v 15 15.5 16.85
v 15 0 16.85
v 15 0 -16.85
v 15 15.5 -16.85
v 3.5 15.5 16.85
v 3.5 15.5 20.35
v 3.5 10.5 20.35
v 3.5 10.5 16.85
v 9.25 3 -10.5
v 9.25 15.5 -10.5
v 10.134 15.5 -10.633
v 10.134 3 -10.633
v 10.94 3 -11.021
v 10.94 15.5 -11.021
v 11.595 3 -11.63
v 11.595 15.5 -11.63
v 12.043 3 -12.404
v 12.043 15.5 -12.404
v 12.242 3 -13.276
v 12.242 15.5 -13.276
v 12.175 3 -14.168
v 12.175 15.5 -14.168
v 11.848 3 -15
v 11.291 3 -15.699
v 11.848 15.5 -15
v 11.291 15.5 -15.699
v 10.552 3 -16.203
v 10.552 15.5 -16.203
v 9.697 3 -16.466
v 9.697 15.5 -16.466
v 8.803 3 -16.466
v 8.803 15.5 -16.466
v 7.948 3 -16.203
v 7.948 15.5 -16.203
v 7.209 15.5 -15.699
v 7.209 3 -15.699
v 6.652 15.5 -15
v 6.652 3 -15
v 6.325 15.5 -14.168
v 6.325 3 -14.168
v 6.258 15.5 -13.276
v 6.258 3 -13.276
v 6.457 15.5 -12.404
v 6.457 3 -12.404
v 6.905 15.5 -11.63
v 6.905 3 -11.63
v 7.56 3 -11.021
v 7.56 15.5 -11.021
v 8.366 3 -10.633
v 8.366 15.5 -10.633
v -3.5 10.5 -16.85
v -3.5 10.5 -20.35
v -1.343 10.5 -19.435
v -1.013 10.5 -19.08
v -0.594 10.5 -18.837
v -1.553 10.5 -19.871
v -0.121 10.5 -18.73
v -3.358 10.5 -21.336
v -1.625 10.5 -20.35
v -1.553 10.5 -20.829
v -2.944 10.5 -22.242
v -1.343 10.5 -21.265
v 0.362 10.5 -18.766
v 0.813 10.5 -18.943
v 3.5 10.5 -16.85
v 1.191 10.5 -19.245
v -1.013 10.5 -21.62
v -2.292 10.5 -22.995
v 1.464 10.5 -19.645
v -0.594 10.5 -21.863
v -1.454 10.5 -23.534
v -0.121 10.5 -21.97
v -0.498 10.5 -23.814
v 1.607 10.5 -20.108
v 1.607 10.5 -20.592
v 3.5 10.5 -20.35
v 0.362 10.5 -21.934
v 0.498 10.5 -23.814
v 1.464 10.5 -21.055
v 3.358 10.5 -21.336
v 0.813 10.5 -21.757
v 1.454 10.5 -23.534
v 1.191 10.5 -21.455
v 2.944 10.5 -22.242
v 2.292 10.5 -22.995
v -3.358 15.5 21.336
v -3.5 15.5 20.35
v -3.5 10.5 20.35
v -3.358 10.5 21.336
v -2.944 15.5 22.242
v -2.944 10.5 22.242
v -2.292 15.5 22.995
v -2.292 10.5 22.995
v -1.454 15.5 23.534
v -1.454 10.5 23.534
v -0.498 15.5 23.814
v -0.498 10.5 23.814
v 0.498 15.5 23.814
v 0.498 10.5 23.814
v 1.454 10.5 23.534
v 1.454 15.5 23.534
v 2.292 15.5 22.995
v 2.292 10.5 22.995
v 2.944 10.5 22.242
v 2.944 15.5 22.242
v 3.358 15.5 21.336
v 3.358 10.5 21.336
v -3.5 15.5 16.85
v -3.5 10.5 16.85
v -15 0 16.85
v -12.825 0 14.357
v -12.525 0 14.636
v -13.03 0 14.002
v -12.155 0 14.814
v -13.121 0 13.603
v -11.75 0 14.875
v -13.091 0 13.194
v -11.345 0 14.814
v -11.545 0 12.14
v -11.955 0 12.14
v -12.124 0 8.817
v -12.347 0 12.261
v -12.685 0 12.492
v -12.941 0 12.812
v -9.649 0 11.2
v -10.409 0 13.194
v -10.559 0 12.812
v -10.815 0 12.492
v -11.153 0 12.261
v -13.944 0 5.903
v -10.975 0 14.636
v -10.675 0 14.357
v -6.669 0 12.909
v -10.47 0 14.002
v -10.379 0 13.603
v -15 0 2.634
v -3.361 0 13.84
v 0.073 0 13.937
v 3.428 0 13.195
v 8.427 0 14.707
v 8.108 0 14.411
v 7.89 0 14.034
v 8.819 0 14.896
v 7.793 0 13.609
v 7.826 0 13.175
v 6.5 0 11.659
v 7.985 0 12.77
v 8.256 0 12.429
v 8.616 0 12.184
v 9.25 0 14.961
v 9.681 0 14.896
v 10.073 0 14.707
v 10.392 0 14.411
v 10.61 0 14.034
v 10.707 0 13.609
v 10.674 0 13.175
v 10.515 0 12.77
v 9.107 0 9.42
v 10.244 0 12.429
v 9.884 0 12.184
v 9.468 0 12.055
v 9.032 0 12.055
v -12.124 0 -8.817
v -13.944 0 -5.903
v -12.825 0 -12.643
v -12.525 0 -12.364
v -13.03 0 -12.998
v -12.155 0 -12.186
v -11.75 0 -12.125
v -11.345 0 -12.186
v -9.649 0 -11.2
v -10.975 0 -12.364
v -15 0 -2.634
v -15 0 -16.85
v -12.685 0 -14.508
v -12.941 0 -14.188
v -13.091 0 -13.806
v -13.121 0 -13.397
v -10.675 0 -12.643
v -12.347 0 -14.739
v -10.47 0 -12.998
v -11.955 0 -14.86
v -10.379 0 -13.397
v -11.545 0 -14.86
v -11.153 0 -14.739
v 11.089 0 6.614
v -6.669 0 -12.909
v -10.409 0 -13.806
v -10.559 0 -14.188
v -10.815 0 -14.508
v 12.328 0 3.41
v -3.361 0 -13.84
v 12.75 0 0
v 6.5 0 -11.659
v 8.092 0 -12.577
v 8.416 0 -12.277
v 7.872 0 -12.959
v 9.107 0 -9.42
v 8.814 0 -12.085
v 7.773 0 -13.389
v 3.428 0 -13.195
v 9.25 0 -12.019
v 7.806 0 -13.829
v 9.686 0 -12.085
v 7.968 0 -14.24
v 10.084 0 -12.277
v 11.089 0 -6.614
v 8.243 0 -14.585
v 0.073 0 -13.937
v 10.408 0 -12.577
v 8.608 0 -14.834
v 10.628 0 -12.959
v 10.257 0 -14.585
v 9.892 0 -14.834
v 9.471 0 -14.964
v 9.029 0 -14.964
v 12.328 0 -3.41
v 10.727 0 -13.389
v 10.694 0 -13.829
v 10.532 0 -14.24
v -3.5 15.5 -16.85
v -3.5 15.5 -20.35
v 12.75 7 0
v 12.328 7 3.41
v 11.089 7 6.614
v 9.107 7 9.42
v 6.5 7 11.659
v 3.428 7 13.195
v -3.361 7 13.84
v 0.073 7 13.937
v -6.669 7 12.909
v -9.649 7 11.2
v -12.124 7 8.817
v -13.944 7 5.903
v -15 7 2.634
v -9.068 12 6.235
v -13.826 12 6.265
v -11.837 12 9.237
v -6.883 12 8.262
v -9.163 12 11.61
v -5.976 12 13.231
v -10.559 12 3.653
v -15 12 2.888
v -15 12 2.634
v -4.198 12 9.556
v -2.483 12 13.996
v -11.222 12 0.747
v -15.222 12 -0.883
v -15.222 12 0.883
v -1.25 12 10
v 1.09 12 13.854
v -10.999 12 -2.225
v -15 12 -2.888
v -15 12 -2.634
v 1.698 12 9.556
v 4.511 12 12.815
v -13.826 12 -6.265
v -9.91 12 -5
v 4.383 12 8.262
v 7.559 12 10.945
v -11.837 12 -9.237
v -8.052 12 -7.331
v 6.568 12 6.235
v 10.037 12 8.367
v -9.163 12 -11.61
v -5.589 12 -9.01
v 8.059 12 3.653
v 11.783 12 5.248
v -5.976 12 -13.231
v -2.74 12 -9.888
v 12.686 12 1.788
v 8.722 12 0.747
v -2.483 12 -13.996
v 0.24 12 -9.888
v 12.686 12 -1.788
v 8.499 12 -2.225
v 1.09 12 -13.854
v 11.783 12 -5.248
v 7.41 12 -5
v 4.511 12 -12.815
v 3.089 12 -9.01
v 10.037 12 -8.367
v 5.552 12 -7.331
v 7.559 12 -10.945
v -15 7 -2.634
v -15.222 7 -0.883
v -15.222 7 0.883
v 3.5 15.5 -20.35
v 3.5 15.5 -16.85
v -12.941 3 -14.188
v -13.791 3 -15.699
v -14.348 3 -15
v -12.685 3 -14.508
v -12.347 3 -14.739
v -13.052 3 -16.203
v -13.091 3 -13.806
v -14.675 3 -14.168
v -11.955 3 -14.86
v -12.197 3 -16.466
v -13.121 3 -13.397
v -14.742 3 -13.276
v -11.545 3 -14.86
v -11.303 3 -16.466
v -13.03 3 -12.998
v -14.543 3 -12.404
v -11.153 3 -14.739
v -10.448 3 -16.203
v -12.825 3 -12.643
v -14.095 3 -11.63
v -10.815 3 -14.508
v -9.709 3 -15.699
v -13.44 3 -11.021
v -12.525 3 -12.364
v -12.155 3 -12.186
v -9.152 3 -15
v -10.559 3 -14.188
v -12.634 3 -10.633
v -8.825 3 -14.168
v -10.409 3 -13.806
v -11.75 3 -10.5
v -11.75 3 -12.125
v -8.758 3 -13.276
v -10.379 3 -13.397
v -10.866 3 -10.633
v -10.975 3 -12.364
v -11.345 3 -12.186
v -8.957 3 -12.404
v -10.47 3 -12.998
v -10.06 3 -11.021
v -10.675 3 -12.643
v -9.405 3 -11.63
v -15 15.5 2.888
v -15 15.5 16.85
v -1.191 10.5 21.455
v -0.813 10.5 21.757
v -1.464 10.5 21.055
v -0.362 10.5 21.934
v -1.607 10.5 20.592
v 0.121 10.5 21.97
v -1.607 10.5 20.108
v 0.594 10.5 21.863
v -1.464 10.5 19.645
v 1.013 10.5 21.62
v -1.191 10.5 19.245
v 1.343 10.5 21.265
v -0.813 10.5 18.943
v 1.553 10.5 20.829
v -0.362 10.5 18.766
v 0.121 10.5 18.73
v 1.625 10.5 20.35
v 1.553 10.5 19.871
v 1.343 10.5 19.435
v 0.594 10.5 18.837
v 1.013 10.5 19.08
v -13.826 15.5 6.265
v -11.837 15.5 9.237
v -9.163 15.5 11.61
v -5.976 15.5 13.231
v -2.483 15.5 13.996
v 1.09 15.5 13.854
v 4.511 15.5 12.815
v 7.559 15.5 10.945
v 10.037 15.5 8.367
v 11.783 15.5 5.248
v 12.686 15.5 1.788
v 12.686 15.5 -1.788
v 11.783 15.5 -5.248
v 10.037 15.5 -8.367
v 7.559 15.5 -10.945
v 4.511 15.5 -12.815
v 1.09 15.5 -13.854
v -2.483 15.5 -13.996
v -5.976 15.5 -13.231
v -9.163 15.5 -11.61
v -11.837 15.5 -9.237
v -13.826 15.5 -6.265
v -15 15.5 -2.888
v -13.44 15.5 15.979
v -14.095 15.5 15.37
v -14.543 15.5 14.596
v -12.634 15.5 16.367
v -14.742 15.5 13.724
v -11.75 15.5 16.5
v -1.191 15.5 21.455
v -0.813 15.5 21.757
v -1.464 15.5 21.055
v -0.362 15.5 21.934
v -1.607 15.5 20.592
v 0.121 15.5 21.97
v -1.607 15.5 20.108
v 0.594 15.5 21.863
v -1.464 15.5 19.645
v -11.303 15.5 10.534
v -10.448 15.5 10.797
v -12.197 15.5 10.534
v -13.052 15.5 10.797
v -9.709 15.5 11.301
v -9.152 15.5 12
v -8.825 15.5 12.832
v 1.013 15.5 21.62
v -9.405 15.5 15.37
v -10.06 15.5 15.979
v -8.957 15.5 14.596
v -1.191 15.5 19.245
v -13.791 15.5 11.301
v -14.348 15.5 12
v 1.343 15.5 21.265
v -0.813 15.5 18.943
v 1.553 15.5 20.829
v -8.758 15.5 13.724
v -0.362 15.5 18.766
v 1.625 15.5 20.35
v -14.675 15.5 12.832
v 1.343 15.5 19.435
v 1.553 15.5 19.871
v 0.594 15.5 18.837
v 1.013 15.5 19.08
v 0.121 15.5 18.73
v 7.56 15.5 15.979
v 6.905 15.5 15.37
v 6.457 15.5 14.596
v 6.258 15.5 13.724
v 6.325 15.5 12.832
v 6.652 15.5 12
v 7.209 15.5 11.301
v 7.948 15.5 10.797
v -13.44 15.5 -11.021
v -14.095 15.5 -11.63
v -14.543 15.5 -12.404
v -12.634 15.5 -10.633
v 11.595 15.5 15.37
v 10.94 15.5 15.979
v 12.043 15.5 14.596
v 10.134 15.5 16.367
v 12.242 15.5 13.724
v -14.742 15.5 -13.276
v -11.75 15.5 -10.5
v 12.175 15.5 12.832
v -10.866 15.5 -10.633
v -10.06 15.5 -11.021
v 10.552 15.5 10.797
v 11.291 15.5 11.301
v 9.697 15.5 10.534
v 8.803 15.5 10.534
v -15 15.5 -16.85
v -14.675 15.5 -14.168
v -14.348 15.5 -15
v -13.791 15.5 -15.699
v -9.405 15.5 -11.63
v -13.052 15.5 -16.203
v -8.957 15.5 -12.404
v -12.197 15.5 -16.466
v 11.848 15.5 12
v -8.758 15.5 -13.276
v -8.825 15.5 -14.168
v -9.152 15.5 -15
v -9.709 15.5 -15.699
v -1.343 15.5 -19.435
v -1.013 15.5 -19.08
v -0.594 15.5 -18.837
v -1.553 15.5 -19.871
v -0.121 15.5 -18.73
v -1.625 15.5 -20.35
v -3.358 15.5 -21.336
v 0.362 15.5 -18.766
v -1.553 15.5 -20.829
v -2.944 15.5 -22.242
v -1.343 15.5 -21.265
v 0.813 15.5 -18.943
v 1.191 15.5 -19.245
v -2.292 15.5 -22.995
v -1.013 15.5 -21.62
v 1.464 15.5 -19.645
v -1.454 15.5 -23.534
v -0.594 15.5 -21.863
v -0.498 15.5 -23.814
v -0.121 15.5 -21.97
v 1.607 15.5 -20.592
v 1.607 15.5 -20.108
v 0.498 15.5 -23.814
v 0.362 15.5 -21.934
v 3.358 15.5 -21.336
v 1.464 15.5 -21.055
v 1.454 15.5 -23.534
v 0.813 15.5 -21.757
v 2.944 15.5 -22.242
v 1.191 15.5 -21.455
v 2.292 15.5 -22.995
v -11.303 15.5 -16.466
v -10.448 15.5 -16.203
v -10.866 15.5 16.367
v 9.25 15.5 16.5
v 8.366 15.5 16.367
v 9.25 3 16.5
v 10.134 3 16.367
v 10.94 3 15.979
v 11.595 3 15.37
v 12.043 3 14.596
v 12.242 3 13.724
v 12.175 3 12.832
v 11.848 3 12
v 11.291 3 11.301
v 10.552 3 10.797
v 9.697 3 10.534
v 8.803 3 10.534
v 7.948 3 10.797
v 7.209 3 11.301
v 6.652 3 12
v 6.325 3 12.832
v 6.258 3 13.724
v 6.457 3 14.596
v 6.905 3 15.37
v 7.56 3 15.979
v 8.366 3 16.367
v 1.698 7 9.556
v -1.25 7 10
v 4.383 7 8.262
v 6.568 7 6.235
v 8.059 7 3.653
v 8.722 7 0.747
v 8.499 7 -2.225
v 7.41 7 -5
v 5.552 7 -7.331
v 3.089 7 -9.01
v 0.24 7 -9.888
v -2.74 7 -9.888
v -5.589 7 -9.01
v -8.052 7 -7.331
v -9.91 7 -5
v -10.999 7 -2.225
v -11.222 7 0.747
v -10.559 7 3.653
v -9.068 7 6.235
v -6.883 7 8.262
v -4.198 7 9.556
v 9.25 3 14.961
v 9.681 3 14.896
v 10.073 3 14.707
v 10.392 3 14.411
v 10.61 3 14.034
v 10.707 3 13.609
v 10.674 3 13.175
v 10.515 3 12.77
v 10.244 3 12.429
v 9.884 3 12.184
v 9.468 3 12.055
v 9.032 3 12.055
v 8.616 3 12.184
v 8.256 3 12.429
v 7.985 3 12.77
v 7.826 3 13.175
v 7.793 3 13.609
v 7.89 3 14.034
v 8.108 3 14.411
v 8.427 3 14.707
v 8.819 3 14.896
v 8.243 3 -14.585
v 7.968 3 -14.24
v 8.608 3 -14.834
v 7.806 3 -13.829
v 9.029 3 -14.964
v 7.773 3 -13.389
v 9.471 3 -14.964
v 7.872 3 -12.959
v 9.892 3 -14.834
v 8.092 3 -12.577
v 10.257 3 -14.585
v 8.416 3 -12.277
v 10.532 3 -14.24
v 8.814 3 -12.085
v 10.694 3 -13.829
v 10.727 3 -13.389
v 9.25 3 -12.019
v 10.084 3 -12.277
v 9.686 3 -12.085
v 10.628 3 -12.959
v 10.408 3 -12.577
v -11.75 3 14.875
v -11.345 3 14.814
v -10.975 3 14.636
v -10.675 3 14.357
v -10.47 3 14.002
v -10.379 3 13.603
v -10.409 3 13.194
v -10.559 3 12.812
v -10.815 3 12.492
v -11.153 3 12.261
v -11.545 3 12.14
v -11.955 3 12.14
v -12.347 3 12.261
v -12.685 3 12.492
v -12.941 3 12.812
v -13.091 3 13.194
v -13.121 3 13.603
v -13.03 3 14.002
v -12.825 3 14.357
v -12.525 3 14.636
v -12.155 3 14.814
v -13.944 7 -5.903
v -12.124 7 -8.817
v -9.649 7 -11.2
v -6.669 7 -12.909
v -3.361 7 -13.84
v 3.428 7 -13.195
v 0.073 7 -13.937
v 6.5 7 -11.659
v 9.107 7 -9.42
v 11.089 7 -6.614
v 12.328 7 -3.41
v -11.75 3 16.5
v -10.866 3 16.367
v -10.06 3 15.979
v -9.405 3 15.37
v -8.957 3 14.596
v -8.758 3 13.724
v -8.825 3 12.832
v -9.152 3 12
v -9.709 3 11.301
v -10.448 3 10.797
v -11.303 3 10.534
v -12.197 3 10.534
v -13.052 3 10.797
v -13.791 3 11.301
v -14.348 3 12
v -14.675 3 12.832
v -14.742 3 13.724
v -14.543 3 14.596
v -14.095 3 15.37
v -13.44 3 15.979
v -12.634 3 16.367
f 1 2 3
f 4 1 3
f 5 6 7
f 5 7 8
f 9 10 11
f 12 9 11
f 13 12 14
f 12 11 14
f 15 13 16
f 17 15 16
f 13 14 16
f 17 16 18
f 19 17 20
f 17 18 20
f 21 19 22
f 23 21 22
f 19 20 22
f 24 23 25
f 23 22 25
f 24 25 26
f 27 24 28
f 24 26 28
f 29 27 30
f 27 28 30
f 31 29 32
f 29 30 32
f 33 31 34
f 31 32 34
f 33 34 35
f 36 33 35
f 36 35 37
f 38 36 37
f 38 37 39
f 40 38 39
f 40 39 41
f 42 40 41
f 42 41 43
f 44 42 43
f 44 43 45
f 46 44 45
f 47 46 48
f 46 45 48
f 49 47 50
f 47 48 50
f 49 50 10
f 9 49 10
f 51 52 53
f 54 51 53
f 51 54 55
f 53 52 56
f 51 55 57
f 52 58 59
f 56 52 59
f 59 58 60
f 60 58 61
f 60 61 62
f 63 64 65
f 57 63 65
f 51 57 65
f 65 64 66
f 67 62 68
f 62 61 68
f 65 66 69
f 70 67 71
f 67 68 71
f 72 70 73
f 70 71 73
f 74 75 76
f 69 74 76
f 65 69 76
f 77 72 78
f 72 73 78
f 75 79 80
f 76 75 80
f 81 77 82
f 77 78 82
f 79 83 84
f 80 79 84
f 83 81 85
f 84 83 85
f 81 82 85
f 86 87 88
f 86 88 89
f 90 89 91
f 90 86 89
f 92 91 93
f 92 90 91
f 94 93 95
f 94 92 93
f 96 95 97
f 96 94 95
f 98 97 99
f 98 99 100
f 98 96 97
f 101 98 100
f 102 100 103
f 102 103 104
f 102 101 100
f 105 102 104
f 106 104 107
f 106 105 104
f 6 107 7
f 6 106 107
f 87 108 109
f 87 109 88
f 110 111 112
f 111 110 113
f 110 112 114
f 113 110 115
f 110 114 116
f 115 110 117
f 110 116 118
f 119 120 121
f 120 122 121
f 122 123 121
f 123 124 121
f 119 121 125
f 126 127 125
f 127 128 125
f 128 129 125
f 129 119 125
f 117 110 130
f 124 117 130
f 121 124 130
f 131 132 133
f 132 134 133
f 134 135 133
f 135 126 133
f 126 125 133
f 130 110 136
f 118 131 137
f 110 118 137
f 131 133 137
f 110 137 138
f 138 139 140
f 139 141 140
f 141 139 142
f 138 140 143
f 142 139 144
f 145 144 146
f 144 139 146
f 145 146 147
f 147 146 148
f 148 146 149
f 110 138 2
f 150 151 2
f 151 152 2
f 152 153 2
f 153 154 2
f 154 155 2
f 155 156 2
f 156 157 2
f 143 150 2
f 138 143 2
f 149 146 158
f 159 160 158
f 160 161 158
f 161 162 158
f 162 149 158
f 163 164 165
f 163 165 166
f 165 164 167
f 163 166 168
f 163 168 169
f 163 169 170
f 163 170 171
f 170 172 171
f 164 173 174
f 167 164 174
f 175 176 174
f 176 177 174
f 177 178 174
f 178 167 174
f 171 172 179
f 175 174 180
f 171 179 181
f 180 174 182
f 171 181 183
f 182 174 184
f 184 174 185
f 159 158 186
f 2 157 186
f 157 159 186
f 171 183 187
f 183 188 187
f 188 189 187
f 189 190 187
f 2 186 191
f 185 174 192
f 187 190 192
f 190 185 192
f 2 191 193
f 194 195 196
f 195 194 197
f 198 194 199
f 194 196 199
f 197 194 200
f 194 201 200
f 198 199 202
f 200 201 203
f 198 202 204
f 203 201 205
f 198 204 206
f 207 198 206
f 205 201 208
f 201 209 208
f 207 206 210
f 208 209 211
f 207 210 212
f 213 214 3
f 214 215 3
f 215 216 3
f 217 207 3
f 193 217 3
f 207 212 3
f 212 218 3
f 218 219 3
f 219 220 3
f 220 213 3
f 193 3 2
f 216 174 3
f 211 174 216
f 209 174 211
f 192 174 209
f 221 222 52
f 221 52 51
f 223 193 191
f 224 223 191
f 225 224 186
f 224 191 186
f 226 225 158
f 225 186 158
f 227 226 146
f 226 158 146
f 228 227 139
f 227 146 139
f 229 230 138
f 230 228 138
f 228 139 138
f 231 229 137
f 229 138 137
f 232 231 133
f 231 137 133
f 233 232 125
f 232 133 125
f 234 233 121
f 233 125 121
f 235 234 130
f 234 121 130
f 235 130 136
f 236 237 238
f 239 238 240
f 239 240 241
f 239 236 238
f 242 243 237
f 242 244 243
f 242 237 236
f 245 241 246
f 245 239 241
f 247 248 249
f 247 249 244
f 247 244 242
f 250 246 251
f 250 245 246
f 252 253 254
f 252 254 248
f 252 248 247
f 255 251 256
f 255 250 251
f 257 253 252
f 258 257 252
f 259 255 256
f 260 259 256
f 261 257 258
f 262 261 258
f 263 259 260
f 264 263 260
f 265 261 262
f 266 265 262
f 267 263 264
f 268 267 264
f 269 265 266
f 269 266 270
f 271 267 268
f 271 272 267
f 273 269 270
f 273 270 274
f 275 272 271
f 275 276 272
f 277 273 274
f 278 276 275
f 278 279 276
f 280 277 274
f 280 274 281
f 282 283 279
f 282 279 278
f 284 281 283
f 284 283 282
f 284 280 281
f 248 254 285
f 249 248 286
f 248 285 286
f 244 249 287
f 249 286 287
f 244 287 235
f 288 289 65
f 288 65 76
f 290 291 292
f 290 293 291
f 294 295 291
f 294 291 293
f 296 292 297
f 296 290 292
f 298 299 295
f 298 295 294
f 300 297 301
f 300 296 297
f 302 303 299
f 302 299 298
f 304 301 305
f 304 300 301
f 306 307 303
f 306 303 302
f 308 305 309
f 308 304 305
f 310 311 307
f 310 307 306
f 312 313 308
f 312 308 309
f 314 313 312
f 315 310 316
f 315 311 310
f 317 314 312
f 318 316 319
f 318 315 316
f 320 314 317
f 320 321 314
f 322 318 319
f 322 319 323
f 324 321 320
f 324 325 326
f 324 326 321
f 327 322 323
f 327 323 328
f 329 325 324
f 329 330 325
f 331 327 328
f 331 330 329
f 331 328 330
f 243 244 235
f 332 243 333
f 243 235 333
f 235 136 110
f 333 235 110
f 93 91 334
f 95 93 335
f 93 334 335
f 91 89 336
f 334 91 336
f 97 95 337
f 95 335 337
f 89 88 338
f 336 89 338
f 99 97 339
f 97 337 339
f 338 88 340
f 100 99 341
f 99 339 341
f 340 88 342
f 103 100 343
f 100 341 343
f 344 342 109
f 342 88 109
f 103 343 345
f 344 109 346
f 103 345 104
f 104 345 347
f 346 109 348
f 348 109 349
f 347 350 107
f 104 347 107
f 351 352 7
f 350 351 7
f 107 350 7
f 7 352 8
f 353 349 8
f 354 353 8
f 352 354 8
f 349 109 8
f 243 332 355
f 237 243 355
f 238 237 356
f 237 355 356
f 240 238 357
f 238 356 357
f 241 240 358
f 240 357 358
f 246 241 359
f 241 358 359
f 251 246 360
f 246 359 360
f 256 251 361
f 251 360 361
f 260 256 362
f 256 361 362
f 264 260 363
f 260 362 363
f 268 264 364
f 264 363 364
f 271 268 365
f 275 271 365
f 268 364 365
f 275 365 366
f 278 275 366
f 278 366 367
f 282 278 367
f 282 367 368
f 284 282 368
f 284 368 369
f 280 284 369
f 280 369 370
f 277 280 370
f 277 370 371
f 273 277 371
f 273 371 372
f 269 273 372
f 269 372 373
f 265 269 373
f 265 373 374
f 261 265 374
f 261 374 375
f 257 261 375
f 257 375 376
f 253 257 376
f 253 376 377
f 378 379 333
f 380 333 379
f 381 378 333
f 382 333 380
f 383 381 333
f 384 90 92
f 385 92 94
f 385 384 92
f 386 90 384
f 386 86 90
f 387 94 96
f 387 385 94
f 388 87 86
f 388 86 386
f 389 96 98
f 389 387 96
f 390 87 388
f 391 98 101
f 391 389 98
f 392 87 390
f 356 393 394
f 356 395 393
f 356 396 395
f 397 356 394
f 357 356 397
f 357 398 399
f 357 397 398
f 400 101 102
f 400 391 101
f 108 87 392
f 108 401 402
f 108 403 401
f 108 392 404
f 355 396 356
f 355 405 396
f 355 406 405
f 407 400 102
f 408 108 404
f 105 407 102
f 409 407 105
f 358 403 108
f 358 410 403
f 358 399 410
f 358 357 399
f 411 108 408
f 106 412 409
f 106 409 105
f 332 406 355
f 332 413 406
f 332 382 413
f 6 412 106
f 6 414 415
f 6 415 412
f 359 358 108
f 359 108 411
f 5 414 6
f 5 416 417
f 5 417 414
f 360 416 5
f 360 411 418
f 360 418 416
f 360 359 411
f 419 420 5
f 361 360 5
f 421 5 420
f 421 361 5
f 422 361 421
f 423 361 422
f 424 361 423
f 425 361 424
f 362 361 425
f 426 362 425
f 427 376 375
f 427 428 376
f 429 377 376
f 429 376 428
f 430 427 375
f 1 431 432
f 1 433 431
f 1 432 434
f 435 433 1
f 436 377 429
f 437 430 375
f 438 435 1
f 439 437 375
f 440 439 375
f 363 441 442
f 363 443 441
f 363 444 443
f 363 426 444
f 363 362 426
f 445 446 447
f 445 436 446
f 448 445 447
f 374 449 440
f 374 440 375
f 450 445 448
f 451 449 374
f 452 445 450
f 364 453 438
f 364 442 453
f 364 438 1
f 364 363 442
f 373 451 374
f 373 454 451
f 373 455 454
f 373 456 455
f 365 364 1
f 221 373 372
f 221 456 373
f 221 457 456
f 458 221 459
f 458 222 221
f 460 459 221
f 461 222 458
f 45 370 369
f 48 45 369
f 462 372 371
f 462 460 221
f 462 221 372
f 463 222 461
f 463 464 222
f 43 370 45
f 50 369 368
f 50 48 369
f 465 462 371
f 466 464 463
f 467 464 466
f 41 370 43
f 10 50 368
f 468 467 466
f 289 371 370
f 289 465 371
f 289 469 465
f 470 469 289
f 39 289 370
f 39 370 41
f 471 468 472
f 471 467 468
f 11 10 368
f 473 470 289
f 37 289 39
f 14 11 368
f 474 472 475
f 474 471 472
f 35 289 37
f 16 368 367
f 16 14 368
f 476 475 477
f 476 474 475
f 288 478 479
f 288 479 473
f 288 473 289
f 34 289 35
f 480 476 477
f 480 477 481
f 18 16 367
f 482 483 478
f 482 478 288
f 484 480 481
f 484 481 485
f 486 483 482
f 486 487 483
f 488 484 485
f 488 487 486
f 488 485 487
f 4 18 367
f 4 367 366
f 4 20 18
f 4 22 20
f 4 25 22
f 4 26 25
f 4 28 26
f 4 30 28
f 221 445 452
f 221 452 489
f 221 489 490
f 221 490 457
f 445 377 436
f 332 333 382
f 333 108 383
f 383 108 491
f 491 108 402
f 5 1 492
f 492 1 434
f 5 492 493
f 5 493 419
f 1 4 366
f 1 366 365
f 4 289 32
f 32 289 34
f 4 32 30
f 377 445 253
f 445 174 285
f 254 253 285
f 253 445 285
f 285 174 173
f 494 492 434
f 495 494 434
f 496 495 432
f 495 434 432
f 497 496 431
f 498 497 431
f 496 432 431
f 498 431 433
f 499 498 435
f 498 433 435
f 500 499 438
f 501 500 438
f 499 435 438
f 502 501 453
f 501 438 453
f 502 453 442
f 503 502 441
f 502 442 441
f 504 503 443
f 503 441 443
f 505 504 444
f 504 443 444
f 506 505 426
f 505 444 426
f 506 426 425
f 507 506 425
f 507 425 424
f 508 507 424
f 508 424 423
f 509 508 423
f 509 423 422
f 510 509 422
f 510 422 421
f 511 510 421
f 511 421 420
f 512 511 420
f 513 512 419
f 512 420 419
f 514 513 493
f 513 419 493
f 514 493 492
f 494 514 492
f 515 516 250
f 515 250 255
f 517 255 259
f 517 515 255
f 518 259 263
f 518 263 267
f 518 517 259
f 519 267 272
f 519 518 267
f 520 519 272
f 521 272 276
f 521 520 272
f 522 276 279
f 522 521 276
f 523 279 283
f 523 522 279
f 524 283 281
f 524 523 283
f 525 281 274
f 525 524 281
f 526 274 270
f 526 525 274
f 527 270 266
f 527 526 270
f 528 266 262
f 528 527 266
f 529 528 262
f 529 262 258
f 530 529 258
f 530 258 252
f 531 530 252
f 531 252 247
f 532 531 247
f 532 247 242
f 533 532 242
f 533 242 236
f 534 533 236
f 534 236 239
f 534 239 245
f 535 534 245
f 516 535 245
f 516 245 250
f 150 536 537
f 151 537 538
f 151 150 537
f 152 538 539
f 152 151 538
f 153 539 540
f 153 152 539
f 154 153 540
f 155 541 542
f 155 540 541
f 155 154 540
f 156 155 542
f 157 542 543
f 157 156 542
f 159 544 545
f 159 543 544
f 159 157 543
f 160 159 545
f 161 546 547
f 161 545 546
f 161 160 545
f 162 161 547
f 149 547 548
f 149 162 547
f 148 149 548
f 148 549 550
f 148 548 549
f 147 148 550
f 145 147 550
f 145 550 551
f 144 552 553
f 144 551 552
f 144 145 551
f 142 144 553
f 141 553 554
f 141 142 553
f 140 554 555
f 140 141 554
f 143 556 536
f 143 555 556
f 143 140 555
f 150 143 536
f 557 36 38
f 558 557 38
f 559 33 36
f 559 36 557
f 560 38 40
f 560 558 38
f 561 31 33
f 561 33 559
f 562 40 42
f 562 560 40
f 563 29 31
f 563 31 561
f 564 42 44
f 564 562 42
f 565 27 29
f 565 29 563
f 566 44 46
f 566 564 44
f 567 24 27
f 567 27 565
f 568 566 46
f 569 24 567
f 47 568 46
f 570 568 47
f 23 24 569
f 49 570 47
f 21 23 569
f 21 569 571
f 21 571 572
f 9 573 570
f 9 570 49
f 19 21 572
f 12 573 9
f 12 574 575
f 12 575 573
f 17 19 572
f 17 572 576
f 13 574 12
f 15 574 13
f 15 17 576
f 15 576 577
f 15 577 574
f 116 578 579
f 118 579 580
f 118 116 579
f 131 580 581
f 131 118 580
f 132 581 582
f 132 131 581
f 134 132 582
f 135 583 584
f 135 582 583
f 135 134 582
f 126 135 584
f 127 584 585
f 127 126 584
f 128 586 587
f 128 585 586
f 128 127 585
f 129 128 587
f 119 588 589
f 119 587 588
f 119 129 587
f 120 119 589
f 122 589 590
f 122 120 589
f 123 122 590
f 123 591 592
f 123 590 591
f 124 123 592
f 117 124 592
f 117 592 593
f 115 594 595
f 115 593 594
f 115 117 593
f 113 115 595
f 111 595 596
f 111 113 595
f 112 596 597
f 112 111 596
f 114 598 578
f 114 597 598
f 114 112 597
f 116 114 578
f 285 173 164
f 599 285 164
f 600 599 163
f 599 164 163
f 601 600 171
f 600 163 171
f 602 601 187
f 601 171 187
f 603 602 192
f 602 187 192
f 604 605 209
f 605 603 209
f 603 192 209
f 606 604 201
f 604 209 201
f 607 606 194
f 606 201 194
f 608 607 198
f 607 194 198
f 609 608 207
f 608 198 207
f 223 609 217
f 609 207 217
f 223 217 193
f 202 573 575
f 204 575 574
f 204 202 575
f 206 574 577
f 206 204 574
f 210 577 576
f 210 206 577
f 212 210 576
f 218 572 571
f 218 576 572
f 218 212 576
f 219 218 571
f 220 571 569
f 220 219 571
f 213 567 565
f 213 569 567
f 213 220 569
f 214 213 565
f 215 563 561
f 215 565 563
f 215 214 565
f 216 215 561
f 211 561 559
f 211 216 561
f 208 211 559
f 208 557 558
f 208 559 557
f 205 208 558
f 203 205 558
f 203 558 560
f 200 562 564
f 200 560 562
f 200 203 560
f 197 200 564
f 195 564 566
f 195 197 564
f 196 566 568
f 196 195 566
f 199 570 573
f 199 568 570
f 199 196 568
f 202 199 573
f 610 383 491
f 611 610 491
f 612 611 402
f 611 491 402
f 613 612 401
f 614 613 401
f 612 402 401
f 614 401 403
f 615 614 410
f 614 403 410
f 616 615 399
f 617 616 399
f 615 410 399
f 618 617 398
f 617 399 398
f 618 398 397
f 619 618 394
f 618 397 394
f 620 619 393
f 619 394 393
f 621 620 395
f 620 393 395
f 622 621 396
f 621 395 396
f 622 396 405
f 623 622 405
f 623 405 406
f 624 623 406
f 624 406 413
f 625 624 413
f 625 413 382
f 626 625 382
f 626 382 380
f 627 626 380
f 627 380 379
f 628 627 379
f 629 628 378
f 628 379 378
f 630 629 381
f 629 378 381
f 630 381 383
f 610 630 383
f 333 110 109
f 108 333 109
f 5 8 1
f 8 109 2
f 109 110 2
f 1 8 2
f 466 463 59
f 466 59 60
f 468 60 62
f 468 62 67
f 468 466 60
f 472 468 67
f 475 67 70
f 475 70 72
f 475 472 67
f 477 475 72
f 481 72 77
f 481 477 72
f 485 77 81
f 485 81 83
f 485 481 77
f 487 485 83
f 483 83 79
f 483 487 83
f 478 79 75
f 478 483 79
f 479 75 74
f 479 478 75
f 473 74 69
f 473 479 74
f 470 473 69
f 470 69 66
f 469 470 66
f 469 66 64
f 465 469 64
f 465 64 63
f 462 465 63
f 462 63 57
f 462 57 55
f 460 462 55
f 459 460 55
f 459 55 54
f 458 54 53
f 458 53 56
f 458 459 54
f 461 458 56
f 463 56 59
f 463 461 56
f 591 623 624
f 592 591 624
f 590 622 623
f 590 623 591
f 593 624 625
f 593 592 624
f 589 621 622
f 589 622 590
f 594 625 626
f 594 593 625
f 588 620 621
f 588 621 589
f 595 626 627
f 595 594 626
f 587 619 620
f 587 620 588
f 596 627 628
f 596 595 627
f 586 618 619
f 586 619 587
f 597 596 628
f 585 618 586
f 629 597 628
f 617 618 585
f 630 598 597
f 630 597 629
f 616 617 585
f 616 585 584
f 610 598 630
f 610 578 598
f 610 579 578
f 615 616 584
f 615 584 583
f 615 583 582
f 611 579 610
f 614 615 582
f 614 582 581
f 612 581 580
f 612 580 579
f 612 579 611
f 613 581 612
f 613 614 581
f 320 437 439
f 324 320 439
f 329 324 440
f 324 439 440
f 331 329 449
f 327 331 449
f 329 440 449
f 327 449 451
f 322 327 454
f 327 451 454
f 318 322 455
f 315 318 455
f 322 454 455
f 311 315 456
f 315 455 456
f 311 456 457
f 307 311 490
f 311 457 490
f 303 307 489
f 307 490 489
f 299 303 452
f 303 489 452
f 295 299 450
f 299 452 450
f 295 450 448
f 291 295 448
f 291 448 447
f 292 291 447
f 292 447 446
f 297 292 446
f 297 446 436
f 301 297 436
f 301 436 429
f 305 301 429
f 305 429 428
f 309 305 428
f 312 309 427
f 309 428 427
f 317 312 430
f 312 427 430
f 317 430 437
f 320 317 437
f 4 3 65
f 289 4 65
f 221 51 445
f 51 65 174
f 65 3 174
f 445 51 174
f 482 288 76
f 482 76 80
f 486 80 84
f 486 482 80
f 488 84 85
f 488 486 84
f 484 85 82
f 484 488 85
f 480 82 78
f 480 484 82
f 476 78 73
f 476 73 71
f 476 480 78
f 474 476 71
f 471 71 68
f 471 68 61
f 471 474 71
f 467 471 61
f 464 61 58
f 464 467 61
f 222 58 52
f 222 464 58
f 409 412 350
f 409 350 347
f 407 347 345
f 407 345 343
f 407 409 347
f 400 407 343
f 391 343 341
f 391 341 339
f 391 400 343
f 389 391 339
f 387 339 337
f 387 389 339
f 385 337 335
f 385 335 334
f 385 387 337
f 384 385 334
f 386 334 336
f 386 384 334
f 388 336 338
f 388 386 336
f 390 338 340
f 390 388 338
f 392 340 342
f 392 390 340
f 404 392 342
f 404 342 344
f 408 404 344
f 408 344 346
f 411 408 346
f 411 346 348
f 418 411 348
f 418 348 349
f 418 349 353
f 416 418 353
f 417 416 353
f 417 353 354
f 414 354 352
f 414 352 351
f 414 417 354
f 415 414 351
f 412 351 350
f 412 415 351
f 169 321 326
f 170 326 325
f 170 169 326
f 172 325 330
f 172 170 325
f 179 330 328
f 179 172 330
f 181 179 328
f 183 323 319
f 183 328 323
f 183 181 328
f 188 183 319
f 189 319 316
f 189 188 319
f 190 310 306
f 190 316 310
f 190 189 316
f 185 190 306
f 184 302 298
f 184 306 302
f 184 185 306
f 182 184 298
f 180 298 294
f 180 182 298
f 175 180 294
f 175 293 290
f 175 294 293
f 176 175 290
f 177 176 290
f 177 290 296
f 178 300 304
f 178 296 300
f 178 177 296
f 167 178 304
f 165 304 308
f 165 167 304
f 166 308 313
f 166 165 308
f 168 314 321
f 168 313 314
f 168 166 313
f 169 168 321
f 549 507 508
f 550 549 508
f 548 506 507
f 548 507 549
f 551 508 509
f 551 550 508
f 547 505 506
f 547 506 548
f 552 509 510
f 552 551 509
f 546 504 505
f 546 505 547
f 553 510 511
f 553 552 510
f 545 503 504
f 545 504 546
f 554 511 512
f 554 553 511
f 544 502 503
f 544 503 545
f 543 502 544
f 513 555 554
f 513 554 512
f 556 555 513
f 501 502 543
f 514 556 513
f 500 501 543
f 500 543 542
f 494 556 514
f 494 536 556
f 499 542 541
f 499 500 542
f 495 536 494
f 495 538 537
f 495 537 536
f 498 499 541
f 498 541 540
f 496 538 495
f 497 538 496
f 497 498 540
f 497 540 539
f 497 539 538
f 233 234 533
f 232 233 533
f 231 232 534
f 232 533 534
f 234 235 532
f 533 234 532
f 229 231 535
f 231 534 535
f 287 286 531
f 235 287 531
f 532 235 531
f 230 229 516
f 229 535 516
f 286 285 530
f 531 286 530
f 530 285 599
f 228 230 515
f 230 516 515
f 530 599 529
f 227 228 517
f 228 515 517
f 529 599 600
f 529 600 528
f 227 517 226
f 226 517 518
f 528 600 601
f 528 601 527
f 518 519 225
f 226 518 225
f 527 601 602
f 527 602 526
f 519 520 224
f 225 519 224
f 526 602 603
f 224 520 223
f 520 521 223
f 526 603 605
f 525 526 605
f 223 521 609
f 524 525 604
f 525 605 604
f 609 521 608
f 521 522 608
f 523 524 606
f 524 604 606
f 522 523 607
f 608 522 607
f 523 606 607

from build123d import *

# Parameters (mm, degrees)
SKETCH1_R           = 1.375
SKETCH1_R_2         = 1.460845326
SKETCH1_R_3         = 1.480655282
BOSS_EXTRUDE1_DEPTH = 15
BOSS_EXTRUDE2_START = -8
SKETCH2_R           = 14
SKETCH2_R_2         = 10
BOSS_EXTRUDE2_DEPTH = 8
CUT_EXTRUDE1_START  = -3
SKETCH3_R           = 14
SKETCH3_R_2         = 10
CUT_EXTRUDE1_DEPTH  = 3
SKETCH5_R           = 1.480655282
SKETCH5_R_2         = 1.375
SKETCH5_R_3         = 1.460845326
BOSS_EXTRUDE3_DEPTH = 0.5
BOSS_EXTRUDE4_DEPTH = 5
SKETCH7_R           = 3
CUT_EXTRUDE2_DEPTH  = 12.5
SKETCH8_R           = 14.05
CUT_EXTRUDE3_DEPTH  = 3.5


with BuildPart() as part:
    # Sketch1 → Boss-Extrude1 (new body)
    with BuildSketch(Plane(origin=(0, 0, 0), x_dir=(1, 0, 0), z_dir=(0, 1, 0))):
        with BuildLine():
            Line((-15, -16.85), (15, -16.85))
            Line((15, -16.85), (15, 16.85))
            Line((15, 16.85), (-15, 16.85))
            Line((-15, 16.85), (-15, 2.633913438))
            ThreePointArc((-15, 2.633913438), (0.072875656, 13.937359865), (12.75, 0))
            ThreePointArc((12.75, 0), (0.072875656, -13.937359865), (-15, -2.633913438))
            Line((-15, -2.633913438), (-15, -16.85))
        make_face()
        with Locations(Location((-11.75, -13.5, 0), (0, 0, 270))):
            Circle(SKETCH1_R, mode=Mode.SUBTRACT)
        with Locations(Location((9.25, -13.5, 0), (0, 0, 270))):
            Circle(SKETCH1_R_2, mode=Mode.SUBTRACT)
        with Locations(Location((-11.75, 13.5, 0), (0, 0, 270))):
            Circle(SKETCH1_R, mode=Mode.SUBTRACT)
        with Locations(Location((9.25, 13.5, 0), (0, 0, 270))):
            Circle(SKETCH1_R_3, mode=Mode.SUBTRACT)
    extrude(amount=BOSS_EXTRUDE1_DEPTH)

    # Sketch2 → Boss-Extrude2 (add)
    with BuildSketch(Plane(origin=(0, 15, 0), x_dir=(1, 0, 0), z_dir=(0, 1, 0)).offset(BOSS_EXTRUDE2_START)):
        with Locations((-1.25, 0)):
            Circle(SKETCH2_R)
        with Locations(Location((-1.25, 0, 0), (0, 0, 270))):
            Circle(SKETCH2_R_2, mode=Mode.SUBTRACT)
    extrude(amount=BOSS_EXTRUDE2_DEPTH)

    # Sketch3 → Cut-Extrude1 (cut)
    with BuildSketch(Plane(origin=(0, 15, 0), x_dir=(1, 0, 0), z_dir=(0, 1, 0)).offset(CUT_EXTRUDE1_START)):
        with Locations((-1.25, 0)):
            Circle(SKETCH3_R)
        with Locations(Location((-1.25, 0, 0), (0, 0, 270))):
            Circle(SKETCH3_R_2, mode=Mode.SUBTRACT)
    extrude(amount=CUT_EXTRUDE1_DEPTH, mode=Mode.SUBTRACT)

    # Sketch5 → Boss-Extrude3 (add)
    with BuildSketch(Plane(origin=(0, 15, 0), x_dir=(1, 0, 0), z_dir=(0, 1, 0))):
        with BuildLine():
            Line((-15, 16.85), (-15, 2.633913438))
            ThreePointArc((-15, 2.633913438), (12.75, 0), (-15, -2.633913438))
            Line((-15, -2.633913438), (-15, -16.85))
            Line((-15, -16.85), (15, -16.85))
            Line((15, -16.85), (15, 16.85))
            Line((15, 16.85), (-15, 16.85))
        make_face()
        with Locations(Location((9.25, 13.5, 0), (0, 0, 270))):
            Circle(SKETCH5_R, mode=Mode.SUBTRACT)
        with Locations(Location((-11.75, -13.5, 0), (0, 0, 270))):
            Circle(SKETCH5_R_2, mode=Mode.SUBTRACT)
        with Locations(Location((-11.75, 13.5, 0), (0, 0, 270))):
            Circle(SKETCH5_R_2, mode=Mode.SUBTRACT)
        with Locations(Location((9.25, -13.5, 0), (0, 0, 270))):
            Circle(SKETCH5_R_3, mode=Mode.SUBTRACT)
    extrude(amount=BOSS_EXTRUDE3_DEPTH)

    # Sketch6 → Boss-Extrude4 (add)
    with BuildSketch(Plane(origin=(0, 15.5, 0), x_dir=(1, 0, 0), z_dir=(0, 1, 0))):
        with BuildLine():
            ThreePointArc((-1.625, 20.35), (0, 21.975), (1.625, 20.35))
            Line((1.625, 20.35), (3.5, 20.35))
            ThreePointArc((3.5, 20.35), (0, 23.85), (-3.5, 20.35))
            Line((-3.5, 20.35), (-1.625, 20.35))
        make_face()
        with BuildLine():
            Line((3.5, 20.35), (1.625, 20.35))
            ThreePointArc((1.625, 20.35), (0, 18.725), (-1.625, 20.35))
            Line((-1.625, 20.35), (-3.5, 20.35))
            ThreePointArc((-3.5, 20.35), (-2.474873743, 17.875126275), (-2.6e-08, 16.85))
            ThreePointArc((-2.6e-08, 16.85), (2.474873725, 17.875126257), (3.5, 20.35))
        make_face()
        with BuildLine():
            Line((3.5, 16.85), (3.5, 20.35))
            ThreePointArc((3.5, 20.35), (2.474873725, 17.875126257), (-2.6e-08, 16.85))
            Line((-2.6e-08, 16.85), (3.5, 16.85))
        make_face()
        with BuildLine():
            ThreePointArc((-2.6e-08, 16.85), (-2.474873743, 17.875126275), (-3.5, 20.35))
            Line((-3.5, 20.35), (-3.5, 16.85))
            Line((-3.5, 16.85), (-2.6e-08, 16.85))
        make_face()
        with BuildLine():
            ThreePointArc((-3.5, -20.35), (-2.474873734, -17.875126266), (0, -16.85))
            Line((0, -16.85), (-3.5, -16.85))
            Line((-3.5, -16.85), (-3.5, -20.35))
        make_face()
        with BuildLine():
            Line((3.5, -20.35), (3.5, -16.85))
            Line((3.5, -16.85), (0, -16.85))
            ThreePointArc((0, -16.85), (2.474873734, -17.875126266), (3.5, -20.35))
        make_face()
        with BuildLine():
            ThreePointArc((-3.5, -20.35), (0, -23.85), (3.5, -20.35))
            Line((3.5, -20.35), (1.625, -20.35))
            ThreePointArc((1.625, -20.35), (0, -21.975), (-1.625, -20.35))
            Line((-1.625, -20.35), (-3.5, -20.35))
        make_face()
        with BuildLine():
            Line((1.625, -20.35), (3.5, -20.35))
            ThreePointArc((3.5, -20.35), (2.474873734, -17.875126266), (0, -16.85))
            ThreePointArc((0, -16.85), (-2.474873734, -17.875126266), (-3.5, -20.35))
            Line((-3.5, -20.35), (-1.625, -20.35))
            ThreePointArc((-1.625, -20.35), (0, -18.725), (1.625, -20.35))
        make_face()
    extrude(amount=-BOSS_EXTRUDE4_DEPTH)

    # Sketch7 → Cut-Extrude2 (cut)
    with BuildSketch(Plane(origin=(0, 15.5, 0), x_dir=(1, 0, 0), z_dir=(0, 1, 0))):
        with Locations(Location((-11.75, 13.5, 0), (0, 0, 270))):
            Circle(SKETCH7_R)
        with Locations(Location((9.25, 13.5, 0), (0, 0, 270))):
            Circle(SKETCH7_R)
        with Locations(Location((9.25, -13.5, 0), (0, 0, 270))):
            Circle(SKETCH7_R)
        with Locations(Location((-11.75, -13.5, 0), (0, 0, 270))):
            Circle(SKETCH7_R)
    extrude(amount=-CUT_EXTRUDE2_DEPTH, mode=Mode.SUBTRACT)

    # Sketch8 → Cut-Extrude3 (cut)
    with BuildSketch(Plane(origin=(0, 15.5, 0), x_dir=(1, 0, 0), z_dir=(0, 1, 0))):
        with Locations((-1.25, 0)):
            Circle(SKETCH8_R)
    extrude(amount=-CUT_EXTRUDE3_DEPTH, mode=Mode.SUBTRACT)


solid = part.part
